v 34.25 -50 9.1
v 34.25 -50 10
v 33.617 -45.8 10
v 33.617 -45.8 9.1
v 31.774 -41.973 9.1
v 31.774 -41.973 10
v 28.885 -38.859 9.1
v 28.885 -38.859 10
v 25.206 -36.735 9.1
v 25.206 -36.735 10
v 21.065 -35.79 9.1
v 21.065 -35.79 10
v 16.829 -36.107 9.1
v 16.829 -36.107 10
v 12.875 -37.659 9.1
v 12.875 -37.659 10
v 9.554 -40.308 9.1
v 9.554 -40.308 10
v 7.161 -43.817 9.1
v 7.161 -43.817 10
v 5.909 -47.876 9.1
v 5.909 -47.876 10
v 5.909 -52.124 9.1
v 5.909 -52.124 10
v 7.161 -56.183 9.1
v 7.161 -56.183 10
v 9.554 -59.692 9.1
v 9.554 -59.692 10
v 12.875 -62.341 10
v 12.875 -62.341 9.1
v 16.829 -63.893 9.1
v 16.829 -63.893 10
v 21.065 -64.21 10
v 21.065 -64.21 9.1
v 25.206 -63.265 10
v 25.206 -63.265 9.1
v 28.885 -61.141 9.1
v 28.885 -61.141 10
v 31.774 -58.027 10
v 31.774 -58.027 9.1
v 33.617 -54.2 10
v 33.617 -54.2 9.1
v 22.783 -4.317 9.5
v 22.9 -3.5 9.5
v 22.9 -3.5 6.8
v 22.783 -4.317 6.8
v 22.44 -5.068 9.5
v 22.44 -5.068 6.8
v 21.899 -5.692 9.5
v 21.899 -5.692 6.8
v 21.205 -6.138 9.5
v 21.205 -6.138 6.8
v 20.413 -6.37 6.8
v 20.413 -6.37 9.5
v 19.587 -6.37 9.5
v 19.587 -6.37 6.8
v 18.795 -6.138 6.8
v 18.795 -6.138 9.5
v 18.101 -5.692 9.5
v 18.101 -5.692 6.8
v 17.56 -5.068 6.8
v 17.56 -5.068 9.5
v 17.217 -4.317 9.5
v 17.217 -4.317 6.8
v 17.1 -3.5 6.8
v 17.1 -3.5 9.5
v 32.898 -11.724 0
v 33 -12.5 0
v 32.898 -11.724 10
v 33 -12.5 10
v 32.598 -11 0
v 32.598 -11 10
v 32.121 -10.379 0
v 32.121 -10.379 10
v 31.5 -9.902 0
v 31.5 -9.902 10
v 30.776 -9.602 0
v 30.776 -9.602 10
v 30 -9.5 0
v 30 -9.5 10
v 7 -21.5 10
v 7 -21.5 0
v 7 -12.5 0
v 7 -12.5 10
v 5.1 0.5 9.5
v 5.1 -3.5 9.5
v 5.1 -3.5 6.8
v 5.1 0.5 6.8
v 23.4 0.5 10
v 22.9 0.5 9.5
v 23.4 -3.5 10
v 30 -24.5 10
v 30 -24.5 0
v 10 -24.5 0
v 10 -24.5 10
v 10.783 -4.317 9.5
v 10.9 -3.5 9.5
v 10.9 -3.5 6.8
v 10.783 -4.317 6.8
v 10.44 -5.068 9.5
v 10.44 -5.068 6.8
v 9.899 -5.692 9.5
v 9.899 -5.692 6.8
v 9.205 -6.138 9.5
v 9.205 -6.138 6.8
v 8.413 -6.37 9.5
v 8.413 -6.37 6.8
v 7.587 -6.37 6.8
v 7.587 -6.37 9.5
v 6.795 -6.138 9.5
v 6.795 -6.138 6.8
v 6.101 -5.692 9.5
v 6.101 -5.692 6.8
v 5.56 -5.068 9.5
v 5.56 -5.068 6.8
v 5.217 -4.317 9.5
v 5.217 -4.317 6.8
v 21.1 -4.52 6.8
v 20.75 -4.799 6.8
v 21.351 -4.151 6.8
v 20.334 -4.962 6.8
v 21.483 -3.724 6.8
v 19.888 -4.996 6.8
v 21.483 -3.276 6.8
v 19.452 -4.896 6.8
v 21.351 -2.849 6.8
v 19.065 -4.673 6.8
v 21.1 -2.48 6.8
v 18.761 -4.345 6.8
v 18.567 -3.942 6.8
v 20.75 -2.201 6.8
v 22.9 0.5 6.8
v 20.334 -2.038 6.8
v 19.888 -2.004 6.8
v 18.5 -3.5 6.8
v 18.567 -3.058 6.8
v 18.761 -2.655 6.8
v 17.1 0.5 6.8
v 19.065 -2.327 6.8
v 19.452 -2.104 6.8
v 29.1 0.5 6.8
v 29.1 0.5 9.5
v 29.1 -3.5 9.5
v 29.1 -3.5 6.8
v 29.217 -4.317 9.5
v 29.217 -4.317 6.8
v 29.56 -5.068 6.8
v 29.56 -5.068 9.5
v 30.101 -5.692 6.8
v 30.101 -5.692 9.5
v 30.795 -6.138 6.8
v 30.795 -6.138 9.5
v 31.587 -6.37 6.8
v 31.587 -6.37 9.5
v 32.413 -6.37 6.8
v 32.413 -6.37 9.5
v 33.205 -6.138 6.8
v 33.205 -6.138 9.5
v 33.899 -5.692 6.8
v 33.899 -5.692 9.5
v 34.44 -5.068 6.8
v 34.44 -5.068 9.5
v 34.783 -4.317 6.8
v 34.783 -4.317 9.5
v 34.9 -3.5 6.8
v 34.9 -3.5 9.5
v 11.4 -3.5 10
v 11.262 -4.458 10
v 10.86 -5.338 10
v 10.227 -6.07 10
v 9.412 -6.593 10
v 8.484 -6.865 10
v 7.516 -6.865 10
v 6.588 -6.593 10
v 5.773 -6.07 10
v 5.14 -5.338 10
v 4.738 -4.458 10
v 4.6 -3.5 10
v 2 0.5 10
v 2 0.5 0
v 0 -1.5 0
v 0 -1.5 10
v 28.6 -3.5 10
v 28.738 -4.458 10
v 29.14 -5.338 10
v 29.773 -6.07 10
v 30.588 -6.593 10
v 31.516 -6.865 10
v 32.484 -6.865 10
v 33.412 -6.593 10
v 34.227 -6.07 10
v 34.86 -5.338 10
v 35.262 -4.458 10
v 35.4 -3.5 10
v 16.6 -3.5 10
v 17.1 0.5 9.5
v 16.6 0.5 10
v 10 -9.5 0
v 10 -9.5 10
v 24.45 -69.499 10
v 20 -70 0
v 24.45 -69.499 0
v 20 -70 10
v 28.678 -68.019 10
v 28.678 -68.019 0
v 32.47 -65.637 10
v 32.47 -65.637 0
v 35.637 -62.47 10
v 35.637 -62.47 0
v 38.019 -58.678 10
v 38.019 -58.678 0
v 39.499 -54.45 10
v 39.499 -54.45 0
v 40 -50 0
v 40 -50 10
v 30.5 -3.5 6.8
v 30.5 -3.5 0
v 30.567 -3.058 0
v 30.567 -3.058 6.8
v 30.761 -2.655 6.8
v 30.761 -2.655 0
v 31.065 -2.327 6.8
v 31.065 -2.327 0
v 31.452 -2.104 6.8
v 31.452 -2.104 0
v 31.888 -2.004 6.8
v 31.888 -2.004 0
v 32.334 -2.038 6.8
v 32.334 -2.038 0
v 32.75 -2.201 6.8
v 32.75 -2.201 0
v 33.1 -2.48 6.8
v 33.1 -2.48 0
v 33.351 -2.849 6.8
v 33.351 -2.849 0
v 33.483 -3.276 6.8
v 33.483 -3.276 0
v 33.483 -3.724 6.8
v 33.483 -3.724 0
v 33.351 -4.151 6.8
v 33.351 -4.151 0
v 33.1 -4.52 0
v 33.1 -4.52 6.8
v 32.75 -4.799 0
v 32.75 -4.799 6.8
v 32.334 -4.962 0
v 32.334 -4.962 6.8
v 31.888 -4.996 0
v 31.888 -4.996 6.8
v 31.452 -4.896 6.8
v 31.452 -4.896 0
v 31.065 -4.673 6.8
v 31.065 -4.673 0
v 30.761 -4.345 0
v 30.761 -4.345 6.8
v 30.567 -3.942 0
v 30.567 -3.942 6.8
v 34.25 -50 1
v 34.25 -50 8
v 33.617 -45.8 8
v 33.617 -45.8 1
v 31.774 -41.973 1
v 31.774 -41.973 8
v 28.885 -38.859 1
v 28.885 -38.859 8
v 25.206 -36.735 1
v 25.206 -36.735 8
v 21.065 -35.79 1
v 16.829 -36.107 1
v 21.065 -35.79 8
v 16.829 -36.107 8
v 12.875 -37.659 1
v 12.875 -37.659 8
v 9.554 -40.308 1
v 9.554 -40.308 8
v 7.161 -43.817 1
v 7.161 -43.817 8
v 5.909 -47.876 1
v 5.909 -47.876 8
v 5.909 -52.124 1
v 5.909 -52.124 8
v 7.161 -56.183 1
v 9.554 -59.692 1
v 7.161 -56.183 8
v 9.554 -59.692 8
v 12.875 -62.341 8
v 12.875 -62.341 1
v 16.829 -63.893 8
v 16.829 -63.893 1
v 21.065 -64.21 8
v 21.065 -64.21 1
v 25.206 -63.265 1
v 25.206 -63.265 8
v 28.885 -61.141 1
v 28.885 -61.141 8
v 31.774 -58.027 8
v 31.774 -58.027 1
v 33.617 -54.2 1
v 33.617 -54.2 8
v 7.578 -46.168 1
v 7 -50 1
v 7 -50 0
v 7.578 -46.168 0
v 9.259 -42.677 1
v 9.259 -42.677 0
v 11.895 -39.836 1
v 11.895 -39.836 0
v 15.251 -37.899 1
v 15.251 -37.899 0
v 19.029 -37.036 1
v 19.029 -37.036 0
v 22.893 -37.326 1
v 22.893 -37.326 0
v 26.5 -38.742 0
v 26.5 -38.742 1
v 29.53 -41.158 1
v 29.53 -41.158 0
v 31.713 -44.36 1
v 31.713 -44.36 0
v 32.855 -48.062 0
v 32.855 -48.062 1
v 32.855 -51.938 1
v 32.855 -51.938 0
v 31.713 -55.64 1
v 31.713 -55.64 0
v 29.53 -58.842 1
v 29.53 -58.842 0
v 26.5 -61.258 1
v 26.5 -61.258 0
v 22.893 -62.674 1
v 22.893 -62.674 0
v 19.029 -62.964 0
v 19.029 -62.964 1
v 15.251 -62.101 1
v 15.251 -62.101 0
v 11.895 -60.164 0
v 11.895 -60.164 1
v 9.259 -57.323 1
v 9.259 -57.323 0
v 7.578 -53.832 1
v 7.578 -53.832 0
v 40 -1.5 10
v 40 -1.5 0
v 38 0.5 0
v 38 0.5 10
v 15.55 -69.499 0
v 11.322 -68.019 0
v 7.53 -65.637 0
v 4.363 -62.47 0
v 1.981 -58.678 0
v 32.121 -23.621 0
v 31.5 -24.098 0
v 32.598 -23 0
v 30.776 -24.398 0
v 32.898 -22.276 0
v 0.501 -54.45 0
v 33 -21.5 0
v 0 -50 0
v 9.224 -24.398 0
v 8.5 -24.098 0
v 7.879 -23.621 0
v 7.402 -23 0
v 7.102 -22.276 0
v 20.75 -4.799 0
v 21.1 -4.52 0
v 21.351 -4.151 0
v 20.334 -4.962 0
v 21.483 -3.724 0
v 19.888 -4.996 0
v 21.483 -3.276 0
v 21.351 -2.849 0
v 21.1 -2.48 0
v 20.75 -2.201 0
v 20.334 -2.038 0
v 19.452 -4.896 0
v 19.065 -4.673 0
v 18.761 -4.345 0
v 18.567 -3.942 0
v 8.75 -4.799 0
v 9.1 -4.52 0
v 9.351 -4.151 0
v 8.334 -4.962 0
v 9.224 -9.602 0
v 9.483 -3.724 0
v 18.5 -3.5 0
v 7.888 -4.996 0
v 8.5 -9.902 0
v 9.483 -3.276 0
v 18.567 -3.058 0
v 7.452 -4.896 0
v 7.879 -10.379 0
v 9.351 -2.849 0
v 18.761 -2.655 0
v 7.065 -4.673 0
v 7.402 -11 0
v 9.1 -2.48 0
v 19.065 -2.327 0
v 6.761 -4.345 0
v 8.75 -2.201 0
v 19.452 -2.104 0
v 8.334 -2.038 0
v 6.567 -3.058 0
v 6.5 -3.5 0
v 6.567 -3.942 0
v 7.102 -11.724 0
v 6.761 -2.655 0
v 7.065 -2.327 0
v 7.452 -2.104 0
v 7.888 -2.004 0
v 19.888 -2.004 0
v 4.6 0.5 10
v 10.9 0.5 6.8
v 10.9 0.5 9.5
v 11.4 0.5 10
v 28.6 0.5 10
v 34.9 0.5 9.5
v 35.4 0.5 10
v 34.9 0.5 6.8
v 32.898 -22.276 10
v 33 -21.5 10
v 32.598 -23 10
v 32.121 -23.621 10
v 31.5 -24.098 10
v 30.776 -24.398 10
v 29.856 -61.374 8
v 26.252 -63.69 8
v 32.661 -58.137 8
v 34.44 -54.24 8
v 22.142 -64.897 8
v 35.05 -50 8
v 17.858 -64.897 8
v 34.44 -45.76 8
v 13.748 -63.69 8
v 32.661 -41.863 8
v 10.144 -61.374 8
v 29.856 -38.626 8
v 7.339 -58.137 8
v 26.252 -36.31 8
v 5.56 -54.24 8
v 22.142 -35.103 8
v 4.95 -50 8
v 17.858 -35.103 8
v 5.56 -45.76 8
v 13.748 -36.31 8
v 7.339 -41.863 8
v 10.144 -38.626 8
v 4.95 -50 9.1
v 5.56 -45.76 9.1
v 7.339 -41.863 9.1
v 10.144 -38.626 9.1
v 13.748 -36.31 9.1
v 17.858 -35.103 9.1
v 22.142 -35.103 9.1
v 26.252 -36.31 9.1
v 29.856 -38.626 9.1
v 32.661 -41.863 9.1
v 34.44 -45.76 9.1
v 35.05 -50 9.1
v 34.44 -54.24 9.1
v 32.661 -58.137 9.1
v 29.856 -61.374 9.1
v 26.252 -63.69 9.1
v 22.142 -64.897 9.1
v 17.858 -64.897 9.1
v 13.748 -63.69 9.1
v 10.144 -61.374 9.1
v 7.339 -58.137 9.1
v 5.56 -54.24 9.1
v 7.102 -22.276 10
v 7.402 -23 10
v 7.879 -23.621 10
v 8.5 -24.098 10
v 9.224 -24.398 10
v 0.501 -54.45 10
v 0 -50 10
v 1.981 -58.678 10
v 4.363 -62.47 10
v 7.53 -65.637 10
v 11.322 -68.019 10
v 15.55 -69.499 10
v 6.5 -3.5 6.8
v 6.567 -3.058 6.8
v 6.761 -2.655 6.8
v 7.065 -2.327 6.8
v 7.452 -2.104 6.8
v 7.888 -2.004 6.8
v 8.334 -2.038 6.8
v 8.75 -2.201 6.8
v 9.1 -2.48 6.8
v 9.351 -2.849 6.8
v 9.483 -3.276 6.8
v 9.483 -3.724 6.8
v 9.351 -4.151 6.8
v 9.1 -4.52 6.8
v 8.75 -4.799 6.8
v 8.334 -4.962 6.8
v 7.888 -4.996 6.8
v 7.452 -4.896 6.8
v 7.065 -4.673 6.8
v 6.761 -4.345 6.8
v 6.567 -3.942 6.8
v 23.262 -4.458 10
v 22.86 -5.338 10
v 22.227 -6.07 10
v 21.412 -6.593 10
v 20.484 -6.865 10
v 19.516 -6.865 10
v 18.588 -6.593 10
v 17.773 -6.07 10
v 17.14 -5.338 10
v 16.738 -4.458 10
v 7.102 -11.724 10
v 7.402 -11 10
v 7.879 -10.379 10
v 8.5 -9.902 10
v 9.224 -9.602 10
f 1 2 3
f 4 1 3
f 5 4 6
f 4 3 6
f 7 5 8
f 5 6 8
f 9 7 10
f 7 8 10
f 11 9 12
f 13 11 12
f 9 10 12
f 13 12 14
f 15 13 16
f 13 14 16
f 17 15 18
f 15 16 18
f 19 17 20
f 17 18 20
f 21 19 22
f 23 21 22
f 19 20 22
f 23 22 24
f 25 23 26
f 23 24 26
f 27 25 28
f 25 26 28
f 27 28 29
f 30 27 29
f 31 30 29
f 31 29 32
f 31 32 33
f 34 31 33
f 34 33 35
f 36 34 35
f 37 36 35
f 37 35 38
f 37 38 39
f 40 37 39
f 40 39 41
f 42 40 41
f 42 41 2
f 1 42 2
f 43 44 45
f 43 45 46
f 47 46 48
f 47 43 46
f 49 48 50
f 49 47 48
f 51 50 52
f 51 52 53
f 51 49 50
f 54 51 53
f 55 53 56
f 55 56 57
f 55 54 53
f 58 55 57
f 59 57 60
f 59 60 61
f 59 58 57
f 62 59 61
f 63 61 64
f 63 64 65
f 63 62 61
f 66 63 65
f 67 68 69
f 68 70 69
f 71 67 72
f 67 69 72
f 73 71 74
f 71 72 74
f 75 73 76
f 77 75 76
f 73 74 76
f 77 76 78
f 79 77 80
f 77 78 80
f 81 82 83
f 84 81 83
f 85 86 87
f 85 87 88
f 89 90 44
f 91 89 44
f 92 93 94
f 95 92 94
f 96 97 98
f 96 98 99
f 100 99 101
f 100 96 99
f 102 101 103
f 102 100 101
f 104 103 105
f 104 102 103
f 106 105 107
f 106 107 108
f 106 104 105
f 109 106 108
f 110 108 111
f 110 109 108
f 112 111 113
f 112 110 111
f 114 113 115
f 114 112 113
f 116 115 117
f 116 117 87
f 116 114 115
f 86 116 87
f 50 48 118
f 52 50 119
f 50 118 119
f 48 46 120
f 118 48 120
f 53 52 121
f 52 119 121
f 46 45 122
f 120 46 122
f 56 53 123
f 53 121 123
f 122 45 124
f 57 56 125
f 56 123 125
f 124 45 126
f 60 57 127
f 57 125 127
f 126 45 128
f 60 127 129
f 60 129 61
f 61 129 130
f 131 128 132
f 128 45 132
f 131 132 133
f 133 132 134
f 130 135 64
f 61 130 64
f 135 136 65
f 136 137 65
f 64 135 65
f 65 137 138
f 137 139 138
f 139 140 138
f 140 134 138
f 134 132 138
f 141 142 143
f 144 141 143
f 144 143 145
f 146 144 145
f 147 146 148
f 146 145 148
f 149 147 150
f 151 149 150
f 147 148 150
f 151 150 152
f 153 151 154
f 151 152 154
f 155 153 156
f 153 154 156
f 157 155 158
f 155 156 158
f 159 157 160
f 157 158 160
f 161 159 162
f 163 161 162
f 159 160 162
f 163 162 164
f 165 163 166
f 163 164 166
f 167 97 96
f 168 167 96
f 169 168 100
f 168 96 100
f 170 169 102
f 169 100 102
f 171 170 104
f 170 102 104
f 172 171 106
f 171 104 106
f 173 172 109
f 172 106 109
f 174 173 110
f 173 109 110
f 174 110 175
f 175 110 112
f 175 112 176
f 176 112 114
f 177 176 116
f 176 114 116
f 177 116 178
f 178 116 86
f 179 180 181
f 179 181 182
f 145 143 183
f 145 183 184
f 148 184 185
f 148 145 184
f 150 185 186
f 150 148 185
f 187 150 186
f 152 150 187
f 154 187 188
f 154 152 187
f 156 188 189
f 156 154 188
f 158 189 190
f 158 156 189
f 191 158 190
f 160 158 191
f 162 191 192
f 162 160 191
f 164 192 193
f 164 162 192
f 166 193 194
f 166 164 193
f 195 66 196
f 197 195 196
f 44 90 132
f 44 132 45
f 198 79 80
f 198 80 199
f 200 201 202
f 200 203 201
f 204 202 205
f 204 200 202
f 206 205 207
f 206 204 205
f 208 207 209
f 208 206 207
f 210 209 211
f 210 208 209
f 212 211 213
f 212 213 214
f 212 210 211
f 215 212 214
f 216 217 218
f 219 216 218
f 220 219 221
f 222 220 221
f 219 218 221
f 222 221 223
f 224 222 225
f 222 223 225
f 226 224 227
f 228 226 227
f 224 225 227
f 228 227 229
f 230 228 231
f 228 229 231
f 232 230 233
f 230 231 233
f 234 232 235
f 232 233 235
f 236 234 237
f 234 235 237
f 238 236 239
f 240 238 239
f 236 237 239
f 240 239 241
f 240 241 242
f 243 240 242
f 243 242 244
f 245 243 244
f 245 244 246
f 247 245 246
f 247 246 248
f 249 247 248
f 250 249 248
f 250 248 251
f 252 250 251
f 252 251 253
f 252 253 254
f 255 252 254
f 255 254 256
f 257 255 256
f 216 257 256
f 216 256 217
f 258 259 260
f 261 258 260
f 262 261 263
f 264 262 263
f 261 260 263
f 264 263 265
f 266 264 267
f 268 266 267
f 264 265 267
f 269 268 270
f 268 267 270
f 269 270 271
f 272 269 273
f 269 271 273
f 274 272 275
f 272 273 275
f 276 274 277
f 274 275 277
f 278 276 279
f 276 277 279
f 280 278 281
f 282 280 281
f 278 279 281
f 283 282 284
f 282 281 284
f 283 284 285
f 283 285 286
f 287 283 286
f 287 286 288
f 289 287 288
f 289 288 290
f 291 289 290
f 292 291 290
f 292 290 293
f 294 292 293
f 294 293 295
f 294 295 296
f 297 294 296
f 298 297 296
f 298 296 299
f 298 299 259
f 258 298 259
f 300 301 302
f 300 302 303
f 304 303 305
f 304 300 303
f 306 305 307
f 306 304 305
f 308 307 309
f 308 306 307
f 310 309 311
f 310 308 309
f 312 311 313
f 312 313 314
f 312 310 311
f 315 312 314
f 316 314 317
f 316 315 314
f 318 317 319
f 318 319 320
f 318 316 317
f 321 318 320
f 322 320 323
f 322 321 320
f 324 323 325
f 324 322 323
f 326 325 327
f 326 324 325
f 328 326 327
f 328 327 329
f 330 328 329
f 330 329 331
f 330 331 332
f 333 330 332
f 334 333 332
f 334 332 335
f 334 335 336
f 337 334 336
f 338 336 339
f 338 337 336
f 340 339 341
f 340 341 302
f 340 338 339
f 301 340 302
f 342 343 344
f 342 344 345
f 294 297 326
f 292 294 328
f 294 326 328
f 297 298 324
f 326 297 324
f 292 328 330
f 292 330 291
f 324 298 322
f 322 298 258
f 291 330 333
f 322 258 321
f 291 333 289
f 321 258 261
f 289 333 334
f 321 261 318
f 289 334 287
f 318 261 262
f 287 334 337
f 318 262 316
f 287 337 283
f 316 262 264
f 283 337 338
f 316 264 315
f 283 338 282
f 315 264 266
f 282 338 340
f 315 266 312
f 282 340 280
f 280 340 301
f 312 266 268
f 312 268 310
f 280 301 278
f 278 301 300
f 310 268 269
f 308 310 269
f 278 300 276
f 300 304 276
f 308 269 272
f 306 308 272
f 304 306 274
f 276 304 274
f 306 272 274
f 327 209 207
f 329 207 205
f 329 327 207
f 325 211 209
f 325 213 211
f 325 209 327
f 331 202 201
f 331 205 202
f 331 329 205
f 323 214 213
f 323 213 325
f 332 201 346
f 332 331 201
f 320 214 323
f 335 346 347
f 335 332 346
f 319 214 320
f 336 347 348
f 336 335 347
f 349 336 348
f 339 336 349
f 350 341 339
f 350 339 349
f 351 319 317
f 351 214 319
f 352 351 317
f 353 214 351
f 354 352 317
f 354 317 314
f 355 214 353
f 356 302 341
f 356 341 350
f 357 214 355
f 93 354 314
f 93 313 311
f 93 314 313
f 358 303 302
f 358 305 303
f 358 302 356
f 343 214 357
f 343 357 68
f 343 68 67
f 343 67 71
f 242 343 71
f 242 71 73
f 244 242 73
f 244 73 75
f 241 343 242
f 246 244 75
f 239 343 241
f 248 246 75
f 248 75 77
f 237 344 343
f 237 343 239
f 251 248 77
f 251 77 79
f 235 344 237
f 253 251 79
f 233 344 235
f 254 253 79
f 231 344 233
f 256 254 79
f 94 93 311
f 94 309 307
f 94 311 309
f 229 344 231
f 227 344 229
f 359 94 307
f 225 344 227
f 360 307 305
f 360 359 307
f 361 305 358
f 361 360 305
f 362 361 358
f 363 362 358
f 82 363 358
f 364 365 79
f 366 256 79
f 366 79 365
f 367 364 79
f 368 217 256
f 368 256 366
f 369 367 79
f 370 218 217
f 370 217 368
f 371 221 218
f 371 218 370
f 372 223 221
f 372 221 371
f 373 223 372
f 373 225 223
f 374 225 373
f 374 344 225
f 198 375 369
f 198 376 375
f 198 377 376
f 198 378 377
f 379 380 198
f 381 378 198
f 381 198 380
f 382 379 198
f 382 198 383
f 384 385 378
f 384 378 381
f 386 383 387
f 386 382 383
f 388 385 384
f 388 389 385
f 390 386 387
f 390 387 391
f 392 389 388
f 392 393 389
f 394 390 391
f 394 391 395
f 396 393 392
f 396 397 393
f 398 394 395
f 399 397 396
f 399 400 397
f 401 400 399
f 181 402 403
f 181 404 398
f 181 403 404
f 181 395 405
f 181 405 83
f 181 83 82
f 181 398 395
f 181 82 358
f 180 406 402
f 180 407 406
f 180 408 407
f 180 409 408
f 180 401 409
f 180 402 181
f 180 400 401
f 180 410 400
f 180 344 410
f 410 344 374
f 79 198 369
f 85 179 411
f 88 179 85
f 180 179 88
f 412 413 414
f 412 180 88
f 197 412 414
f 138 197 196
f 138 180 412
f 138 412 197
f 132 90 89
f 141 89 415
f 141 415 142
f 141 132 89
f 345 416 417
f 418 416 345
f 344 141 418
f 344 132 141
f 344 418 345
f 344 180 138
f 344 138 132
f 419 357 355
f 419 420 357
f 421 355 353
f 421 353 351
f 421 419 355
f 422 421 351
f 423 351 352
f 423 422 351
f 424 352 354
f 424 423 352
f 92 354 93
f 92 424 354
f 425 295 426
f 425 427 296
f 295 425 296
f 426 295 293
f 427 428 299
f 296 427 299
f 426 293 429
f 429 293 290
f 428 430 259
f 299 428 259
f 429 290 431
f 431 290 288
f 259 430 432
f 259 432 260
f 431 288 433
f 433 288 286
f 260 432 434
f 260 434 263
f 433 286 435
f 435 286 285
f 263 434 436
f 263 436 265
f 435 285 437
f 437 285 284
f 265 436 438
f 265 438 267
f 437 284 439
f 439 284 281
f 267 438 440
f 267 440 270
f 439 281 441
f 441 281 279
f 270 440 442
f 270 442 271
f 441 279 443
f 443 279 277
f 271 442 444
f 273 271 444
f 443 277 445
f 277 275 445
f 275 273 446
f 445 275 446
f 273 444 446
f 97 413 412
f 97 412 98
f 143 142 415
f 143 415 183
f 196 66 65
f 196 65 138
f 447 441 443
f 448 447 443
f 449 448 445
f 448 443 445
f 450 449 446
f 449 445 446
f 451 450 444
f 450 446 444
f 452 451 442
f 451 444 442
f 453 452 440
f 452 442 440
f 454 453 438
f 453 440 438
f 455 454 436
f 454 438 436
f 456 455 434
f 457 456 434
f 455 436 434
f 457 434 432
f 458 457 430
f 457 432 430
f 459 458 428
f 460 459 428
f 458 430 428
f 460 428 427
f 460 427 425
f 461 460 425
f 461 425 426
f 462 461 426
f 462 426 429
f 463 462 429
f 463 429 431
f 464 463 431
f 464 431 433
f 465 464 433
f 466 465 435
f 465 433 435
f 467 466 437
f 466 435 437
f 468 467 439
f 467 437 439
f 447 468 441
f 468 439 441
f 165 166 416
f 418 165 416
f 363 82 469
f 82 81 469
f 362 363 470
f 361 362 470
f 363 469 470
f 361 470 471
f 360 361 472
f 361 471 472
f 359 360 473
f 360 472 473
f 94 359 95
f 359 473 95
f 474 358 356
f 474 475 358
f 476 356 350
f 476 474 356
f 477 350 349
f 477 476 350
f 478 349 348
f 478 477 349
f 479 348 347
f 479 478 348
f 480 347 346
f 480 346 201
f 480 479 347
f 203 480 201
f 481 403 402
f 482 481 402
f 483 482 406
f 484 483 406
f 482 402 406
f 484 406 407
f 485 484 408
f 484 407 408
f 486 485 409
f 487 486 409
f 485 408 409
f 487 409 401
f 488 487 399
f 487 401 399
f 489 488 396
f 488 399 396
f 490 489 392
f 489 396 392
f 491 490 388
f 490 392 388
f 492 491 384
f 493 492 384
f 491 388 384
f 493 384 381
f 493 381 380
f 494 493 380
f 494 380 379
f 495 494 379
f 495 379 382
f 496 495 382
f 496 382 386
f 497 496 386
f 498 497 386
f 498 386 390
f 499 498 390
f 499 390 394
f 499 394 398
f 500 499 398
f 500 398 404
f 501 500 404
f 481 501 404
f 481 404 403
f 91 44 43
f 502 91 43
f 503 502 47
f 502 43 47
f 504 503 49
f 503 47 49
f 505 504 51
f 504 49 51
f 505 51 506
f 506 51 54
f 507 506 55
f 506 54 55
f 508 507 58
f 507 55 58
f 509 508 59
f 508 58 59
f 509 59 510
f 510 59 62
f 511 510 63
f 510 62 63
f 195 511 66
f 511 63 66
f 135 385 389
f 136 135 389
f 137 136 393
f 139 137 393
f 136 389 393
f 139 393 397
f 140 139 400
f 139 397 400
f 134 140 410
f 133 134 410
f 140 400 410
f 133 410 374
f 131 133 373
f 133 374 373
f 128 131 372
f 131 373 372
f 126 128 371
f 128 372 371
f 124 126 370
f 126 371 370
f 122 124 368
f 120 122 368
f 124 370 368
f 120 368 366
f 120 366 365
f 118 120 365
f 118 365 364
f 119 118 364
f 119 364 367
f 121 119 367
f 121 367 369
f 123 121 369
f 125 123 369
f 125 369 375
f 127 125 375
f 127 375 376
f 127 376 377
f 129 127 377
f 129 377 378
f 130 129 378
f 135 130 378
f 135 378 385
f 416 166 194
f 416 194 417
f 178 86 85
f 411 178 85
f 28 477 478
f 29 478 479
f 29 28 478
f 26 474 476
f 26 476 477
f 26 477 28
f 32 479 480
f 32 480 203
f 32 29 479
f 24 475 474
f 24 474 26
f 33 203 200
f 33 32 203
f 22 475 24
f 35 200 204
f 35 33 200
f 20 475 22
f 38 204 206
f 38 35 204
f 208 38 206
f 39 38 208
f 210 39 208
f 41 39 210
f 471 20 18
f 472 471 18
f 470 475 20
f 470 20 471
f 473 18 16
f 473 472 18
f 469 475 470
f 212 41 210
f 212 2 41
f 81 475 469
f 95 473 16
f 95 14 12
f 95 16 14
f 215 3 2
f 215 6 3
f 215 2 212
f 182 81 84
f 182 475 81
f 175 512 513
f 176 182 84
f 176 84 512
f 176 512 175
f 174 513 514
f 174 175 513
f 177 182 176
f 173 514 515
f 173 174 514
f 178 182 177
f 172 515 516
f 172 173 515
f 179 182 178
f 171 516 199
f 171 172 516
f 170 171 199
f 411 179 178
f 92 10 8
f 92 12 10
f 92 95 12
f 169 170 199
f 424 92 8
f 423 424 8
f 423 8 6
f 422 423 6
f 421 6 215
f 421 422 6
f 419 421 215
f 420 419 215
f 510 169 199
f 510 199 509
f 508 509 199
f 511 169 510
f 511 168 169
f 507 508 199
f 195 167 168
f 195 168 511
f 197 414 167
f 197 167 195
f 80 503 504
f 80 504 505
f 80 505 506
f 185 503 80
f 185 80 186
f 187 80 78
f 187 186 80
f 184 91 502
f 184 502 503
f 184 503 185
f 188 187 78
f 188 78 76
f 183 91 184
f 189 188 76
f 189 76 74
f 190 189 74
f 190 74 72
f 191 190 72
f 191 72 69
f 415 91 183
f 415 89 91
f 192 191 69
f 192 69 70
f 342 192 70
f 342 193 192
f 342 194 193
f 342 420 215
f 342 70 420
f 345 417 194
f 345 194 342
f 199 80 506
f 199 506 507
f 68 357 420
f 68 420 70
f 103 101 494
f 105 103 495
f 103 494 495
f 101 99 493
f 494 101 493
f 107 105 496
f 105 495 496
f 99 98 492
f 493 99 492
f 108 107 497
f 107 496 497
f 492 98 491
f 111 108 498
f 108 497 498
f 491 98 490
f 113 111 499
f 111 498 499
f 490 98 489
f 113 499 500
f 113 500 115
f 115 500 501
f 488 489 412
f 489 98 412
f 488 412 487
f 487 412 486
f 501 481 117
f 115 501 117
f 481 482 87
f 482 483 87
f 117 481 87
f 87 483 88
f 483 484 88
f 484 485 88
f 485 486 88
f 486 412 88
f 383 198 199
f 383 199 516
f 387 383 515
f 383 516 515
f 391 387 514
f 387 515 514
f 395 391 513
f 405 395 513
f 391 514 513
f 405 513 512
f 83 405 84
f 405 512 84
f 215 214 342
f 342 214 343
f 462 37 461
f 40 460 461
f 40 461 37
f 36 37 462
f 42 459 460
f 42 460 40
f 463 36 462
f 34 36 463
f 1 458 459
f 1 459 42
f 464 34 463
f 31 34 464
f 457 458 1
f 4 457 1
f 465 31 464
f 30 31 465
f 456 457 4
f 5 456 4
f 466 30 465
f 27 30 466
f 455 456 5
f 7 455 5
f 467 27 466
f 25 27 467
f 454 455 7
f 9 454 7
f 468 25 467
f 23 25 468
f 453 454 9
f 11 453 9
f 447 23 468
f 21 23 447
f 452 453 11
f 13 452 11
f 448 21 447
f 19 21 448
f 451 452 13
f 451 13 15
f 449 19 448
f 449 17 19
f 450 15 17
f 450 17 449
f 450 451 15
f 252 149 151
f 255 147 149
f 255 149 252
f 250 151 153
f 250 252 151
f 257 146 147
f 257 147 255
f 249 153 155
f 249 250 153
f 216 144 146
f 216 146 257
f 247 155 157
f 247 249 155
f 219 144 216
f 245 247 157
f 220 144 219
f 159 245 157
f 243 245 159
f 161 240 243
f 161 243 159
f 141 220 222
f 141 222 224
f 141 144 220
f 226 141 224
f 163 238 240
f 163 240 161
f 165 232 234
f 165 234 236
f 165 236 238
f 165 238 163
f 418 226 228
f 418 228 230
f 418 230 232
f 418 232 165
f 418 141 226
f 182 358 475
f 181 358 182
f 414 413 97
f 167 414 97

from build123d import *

# Parameters (mm, degrees)
SKETCH_1_W          = 40
SKETCH_1_H          = 70.5
EXTRUDE_1_DEPTH     = 10
SKETCH_2_R          = 14.25
CUT_EXTRUDE_1_DEPTH = 12
SKETCH_3_R          = 15.05
CUT_EXTRUDE_2_DEPTH = 1.1
CHAMFER_1_SIZE      = 2
FILLET_1_R          = 20
SKETCH_4_R          = 1.5
CUT_EXTRUDE_3_DEPTH = 15
SKETCH_5_W          = 26
SKETCH_5_H          = 15
CUT_EXTRUDE_4_DEPTH = 15
FILLET_2_R          = 3
EXTRUDE_START       = -1
SKETCH_7_R          = 14.25
SKETCH_7_R_2        = 13
EXTRUDE_2_DEPTH     = 1
CUT_EXTRUDE_5_DEPTH = 3.2
CHAMFER_2_SIZE      = 0.5


with BuildPart() as part:
    # 草图1 → 凸台-拉伸1 (new body)
    with BuildSketch(Plane.XY):
        with Locations((20, -34.75)):
            Rectangle(SKETCH_1_W, SKETCH_1_H)
    extrude(amount=EXTRUDE_1_DEPTH)

    # 草图2 → 切除-拉伸1 (cut)
    with BuildSketch(Plane.XY.offset(10)):
        with Locations((20, -50)):
            Circle(SKETCH_2_R)
    extrude(amount=-CUT_EXTRUDE_1_DEPTH, mode=Mode.SUBTRACT)

    # 草图3 → 切除-拉伸2 (cut)
    with BuildSketch(Plane(origin=(0, 0, 8), x_dir=(-1, 0, 0), z_dir=(0, 0, -1))):
        with Locations((-20, -50)):
            Circle(SKETCH_3_R)
    extrude(amount=-CUT_EXTRUDE_2_DEPTH, mode=Mode.SUBTRACT)

    # 倒角1
    chamfer_1_edges = [part.edges().sort_by_distance(p)[0] for p in [
        (0, 0.5, 5),
        (40, 0.5, 5),
    ]]
    chamfer(chamfer_1_edges, length=CHAMFER_1_SIZE)

    # 圆角1
    fillet_1_edges = [part.edges().sort_by_distance(p)[0] for p in [
        (0, -70, 5),
        (40, -70, 5),
    ]]
    fillet(fillet_1_edges, radius=FILLET_1_R - 0.0001)  # a hair under: the kernel refuses the full size

    # 草图4 → 切除-拉伸3 (cut)
    with BuildSketch(Plane(origin=(0, 0, 0), x_dir=(-1, 0, 0), z_dir=(0, 0, -1))):
        with Locations((-32, -3.5)):
            Circle(SKETCH_4_R)
        with Locations((-20, -3.5)):
            Circle(SKETCH_4_R)
        with Locations((-8, -3.5)):
            Circle(SKETCH_4_R)
    extrude(amount=-CUT_EXTRUDE_3_DEPTH, mode=Mode.SUBTRACT)

    # 草图5 → 切除-拉伸4 (cut)
    with BuildSketch(Plane(origin=(0, 0, 0), x_dir=(-1, 0, 0), z_dir=(0, 0, -1))):
        with Locations((-20, -17)):
            Rectangle(SKETCH_5_W, SKETCH_5_H)
    extrude(amount=-CUT_EXTRUDE_4_DEPTH, mode=Mode.SUBTRACT)

    # 圆角2
    fillet_2_edges = [part.edges().sort_by_distance(p)[0] for p in [
        (7, -9.5, 5),
        (7, -24.5, 5),
        (33, -24.5, 5),
        (33, -9.5, 5),
    ]]
    fillet(fillet_2_edges, radius=FILLET_2_R)

    # 草图7 → 凸台-拉伸2 (add)
    with BuildSketch(Plane(origin=(0, 0, 0), x_dir=(-1, 0, 0), z_dir=(0, 0, -1)).offset(EXTRUDE_START)):
        with Locations((-20, -50)):
            Circle(SKETCH_7_R)
        with Locations((-20, -50)):
            Circle(SKETCH_7_R_2, mode=Mode.SUBTRACT)
    extrude(amount=EXTRUDE_2_DEPTH)

    # 草图8 → 切除-拉伸5 (cut)
    with BuildSketch(Plane.XY.offset(10)):
        with BuildLine():
            Line((5.1, -3.5), (5.1, 0.5))
            Line((5.1, 0.5), (10.9, 0.5))
            Line((10.9, 0.5), (10.9, -3.5))
            ThreePointArc((10.9, -3.5), (8, -6.4), (5.1, -3.5))
        make_face()
        with BuildLine():
            Line((17.1, -3.5), (17.1, 0.5))
            Line((17.1, 0.5), (22.9, 0.5))
            Line((22.9, 0.5), (22.9, -3.5))
            ThreePointArc((22.9, -3.5), (20, -6.4), (17.1, -3.5))
        make_face()
        with BuildLine():
            Line((34.9, -3.5), (34.9, 0.5))
            Line((34.9, 0.5), (29.1, 0.5))
            Line((29.1, 0.5), (29.1, -3.5))
            ThreePointArc((29.1, -3.5), (32, -6.4), (34.9, -3.5))
        make_face()
    extrude(amount=-CUT_EXTRUDE_5_DEPTH, mode=Mode.SUBTRACT)

    # 倒角2
    chamfer_2_edges = [part.edges().sort_by_distance(p)[0] for p in [
        (8, -6.4, 10),
        (10.9, -1.5, 10),
        (5.1, -1.5, 10),
        (32, -6.4, 10),
        (34.9, -1.5, 10),
        (29.1, -1.5, 10),
        (20, -6.4, 10),
        (22.9, -1.5, 10),
        (17.1, -1.5, 10),
    ]]
    chamfer(chamfer_2_edges, length=CHAMFER_2_SIZE)


solid = part.part
